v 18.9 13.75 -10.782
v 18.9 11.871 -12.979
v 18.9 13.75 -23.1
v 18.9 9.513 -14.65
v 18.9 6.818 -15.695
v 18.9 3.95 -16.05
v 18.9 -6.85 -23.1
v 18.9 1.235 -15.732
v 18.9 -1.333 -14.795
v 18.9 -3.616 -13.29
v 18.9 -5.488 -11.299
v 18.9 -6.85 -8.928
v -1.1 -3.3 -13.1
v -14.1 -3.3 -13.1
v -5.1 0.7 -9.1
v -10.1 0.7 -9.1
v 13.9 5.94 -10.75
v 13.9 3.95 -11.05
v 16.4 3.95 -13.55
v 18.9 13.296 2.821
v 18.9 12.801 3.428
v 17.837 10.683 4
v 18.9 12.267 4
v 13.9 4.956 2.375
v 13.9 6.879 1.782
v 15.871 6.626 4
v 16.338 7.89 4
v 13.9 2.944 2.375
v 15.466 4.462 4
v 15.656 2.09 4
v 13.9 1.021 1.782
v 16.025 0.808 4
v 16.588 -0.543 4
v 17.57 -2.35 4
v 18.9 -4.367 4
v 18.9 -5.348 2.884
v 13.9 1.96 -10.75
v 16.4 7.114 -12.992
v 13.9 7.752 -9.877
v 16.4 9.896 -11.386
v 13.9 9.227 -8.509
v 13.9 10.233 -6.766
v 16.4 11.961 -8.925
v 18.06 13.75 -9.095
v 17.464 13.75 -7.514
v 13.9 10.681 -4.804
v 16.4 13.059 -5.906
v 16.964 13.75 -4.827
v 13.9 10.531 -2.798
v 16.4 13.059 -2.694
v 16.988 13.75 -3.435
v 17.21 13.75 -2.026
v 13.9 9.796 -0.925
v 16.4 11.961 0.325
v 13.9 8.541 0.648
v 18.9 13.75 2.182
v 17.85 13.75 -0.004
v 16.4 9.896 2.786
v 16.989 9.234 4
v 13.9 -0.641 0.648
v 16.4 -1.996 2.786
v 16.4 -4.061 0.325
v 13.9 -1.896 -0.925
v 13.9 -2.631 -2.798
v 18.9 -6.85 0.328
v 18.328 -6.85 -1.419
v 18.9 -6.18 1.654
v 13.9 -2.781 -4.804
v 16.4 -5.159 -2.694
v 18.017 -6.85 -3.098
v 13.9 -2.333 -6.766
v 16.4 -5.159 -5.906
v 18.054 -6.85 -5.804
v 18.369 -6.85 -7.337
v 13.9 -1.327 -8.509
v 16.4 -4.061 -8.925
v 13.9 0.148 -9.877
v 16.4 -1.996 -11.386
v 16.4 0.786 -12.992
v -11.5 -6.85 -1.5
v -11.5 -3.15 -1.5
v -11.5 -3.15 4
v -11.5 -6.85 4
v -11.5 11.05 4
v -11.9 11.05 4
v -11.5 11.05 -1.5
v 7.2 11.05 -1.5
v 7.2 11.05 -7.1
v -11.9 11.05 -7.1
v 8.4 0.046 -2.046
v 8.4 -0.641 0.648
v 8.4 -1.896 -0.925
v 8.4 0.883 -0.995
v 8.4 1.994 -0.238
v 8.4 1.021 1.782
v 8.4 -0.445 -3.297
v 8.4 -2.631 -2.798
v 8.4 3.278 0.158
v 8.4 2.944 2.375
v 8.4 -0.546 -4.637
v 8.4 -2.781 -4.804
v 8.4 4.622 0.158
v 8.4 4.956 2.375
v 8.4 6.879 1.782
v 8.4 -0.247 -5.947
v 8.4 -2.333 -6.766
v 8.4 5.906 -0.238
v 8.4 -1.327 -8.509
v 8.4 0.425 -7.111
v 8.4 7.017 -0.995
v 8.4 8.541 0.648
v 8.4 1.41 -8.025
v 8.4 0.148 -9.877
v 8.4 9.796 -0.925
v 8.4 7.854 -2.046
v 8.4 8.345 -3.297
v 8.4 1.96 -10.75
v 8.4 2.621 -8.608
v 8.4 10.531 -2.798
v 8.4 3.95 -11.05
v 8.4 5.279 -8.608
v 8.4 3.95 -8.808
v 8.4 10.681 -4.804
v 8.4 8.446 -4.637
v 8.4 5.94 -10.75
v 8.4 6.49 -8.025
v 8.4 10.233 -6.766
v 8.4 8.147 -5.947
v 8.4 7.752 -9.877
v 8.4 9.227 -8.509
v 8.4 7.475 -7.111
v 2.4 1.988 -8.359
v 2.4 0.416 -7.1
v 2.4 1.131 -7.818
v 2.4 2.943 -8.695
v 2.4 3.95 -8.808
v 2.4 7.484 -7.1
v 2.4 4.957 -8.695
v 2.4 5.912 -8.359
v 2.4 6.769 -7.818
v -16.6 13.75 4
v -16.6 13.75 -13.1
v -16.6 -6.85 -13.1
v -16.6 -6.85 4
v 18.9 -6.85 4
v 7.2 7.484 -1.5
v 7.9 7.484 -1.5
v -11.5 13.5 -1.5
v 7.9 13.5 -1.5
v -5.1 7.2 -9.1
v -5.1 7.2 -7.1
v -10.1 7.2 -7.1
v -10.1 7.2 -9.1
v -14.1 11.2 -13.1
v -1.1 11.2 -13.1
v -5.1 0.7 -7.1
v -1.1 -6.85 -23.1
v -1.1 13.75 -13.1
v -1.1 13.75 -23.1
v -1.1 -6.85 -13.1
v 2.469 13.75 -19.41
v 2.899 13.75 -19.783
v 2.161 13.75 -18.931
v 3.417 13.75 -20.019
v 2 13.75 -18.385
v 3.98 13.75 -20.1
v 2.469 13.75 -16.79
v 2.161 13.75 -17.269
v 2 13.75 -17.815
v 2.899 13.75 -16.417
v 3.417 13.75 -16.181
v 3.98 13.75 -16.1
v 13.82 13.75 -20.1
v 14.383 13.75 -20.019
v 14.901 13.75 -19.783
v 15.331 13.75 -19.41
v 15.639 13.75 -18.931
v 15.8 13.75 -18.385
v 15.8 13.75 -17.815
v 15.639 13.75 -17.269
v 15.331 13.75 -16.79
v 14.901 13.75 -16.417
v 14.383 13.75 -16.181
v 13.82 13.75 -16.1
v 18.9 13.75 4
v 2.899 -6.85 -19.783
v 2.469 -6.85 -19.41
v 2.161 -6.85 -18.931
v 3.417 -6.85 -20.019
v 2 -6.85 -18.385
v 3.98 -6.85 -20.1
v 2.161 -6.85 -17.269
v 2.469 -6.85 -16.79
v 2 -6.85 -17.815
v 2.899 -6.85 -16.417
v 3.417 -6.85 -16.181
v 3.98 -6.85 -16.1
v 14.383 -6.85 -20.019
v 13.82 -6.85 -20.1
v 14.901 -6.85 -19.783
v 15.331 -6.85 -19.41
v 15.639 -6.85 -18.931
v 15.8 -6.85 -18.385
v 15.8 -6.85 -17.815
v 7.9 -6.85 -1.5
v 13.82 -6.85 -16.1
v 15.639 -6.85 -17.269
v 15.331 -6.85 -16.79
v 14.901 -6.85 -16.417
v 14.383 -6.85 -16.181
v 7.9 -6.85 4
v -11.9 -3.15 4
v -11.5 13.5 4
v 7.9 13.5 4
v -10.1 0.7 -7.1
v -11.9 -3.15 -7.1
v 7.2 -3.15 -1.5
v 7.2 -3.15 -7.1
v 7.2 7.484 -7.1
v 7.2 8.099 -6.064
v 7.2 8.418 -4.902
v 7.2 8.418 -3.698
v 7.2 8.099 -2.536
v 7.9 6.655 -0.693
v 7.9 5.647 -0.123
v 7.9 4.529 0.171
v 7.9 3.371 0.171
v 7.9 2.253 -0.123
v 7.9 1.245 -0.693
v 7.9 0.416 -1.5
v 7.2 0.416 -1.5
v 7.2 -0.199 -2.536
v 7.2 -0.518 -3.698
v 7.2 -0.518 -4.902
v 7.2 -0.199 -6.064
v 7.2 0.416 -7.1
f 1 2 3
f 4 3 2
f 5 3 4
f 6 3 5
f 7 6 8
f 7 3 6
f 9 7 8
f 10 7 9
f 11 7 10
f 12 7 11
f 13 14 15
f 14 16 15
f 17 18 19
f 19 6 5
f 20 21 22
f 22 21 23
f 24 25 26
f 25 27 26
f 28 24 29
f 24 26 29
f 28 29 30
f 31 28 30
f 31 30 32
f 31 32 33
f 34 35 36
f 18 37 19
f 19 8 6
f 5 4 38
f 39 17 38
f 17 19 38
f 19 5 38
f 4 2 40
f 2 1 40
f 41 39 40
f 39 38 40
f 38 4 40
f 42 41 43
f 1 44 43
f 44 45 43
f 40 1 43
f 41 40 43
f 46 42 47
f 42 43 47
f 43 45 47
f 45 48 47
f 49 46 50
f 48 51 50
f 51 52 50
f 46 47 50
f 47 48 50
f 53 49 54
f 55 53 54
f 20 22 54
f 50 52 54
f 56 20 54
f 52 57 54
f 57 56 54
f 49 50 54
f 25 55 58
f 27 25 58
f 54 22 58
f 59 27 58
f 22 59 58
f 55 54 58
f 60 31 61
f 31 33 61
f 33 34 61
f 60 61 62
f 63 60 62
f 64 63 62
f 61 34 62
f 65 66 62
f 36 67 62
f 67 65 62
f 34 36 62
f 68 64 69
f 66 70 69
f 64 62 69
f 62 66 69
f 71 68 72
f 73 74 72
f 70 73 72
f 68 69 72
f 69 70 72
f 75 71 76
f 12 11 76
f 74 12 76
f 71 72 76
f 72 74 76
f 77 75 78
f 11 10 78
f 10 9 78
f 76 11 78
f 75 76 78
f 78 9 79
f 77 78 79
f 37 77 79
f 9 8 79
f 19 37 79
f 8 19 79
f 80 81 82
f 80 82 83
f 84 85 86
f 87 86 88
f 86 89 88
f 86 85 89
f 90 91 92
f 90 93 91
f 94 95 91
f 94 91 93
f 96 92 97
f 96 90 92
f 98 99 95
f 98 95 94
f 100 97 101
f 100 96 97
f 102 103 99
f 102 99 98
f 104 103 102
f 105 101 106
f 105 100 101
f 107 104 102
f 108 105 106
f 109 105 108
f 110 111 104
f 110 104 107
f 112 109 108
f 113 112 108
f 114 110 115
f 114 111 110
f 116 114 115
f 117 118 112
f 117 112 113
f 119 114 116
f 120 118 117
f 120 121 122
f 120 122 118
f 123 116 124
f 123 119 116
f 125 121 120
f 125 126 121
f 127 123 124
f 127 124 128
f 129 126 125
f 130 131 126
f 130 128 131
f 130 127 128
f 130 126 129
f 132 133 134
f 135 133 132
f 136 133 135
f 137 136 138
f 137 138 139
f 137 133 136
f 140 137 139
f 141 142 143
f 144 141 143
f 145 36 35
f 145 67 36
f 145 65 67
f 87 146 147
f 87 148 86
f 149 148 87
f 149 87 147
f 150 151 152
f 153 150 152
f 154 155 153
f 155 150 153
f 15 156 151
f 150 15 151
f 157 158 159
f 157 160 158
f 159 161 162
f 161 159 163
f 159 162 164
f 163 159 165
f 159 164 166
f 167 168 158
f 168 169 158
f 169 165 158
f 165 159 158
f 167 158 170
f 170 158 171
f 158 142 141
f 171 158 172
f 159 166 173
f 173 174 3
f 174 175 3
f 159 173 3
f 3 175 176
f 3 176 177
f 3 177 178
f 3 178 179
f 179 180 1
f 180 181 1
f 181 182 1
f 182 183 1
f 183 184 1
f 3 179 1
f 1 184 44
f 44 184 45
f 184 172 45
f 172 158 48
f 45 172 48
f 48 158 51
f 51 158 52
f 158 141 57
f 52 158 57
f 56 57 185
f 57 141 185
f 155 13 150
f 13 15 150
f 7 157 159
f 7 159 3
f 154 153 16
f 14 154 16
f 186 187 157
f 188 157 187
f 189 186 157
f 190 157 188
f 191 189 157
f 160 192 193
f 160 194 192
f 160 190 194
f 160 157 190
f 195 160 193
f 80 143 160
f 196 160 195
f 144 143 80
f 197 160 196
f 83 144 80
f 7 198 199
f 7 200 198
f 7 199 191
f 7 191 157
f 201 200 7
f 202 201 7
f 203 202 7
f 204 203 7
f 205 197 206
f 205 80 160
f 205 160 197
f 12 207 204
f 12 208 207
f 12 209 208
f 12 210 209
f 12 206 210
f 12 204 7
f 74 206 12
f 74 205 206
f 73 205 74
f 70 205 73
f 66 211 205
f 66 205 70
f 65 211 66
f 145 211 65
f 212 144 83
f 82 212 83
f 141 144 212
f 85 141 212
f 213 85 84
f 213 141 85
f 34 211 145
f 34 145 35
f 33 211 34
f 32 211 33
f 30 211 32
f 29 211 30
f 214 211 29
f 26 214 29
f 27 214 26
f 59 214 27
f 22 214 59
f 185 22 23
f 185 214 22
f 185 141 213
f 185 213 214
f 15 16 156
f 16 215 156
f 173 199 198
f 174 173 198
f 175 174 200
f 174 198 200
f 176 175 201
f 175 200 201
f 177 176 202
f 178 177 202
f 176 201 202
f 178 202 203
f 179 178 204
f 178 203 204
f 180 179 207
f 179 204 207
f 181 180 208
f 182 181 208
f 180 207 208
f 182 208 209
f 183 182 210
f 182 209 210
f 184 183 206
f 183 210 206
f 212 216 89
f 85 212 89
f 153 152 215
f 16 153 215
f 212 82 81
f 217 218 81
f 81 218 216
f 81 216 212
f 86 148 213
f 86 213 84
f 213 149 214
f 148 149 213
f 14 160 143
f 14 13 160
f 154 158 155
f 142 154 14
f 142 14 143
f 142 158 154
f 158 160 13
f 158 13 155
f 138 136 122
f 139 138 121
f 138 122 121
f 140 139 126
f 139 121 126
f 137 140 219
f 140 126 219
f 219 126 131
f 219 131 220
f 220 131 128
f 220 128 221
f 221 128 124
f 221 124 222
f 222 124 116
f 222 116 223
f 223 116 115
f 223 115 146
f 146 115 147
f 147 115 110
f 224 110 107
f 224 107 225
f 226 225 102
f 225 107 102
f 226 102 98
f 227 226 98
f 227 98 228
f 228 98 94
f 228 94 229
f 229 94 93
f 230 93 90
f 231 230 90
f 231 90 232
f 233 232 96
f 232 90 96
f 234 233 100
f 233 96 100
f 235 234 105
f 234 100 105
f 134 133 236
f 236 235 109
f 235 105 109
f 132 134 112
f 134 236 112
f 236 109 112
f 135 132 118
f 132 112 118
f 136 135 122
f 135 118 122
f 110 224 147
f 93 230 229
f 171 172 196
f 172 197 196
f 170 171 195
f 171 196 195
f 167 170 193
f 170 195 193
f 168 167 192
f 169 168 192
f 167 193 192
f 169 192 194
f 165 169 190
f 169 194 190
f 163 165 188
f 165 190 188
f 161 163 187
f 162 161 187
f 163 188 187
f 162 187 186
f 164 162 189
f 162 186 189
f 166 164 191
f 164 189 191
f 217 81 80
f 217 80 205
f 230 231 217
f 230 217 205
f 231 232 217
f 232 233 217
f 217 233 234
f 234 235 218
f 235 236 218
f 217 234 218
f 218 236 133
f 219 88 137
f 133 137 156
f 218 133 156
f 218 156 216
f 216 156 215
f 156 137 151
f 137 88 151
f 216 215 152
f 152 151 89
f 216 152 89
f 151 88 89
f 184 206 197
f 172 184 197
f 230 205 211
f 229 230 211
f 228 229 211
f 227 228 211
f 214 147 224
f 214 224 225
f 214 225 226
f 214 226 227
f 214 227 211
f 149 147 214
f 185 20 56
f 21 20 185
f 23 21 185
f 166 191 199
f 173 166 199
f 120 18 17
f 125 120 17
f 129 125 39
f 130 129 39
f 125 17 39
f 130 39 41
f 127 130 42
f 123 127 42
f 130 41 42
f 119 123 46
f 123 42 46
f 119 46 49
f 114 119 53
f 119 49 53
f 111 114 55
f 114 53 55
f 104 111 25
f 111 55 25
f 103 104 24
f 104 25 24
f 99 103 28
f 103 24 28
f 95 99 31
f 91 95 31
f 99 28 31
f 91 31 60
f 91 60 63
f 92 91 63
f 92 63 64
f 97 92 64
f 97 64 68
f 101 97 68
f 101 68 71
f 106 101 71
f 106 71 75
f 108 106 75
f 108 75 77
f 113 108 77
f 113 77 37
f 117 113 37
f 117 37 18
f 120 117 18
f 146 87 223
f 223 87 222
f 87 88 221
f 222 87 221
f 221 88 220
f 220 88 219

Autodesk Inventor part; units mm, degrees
ref_plane "YZ Plane" through (0, 0, 0) normal (1, 0, 0) x (0, 1, 0)
ref_plane "XZ Plane" through (0, 0, 0) normal (0, 1, 0) x (-1, 0, 0)
ref_plane "Arbeitsebene1" through (0, 0, 0) normal (0, 0, 1) x (1, 0, 0)
ref_plane "Arbeitsebene2" through (-2.35, 3.95, -7.1) normal (0, 0, -1) x (-1, 0, 0)
sketch "Skizze1" plane through (-2.35, 3.95, -7.1) normal (0, 0, -1) x (-1, 0, 0)
  line L0 (7.75, 3.25) -> (7.75, -3.25) projected
  line L1 (7.75, -3.25) -> (2.75, -3.25) projected
  line L2 (2.75, -3.25) -> (2.75, 3.25) projected
  line L3 (2.75, 3.25) -> (7.75, 3.25) projected
  line L4 (9.25, -6.8) -> (9.25, 6.8) projected
  line L5 (9.25, 6.8) -> (-9.25, 6.8) projected
  line L6 (-9.25, 6.8) -> (-9.25, -6.8) projected
  line L7 (-9.25, -6.8) -> (9.25, -6.8) projected
  line L8 (14.25, 9.8) -> (-21.25, 9.8)
  line L9 (-21.25, 9.8) -> (-21.25, -10.8)
  line L10 (-21.25, -10.8) -> (14.25, -10.8)
  line L11 (14.25, -10.8) -> (14.25, 9.8)
  point P0 (-2.35, -3.95)
  dimension "d0" = 5
  dimension "d1" = 3
  dimension "d2" = 4
  dimension "d3" = 12
extrude "Extrusion1" add sketch "Skizze1" along normal blind 6 contours L7 L6 L5 L4 | L11 L10 L9 L8
sketch "Skizze2" plane through (-2.35, 3.95, -7.1) normal (0, 0, 1) x (1, 0, 0)
  line L0 (-9.25, -6.8) -> (-9.25, 6.8) projected
  line L1 (9.25, -6.8) -> (-9.25, -6.8) projected
  line L2 (9.25, 6.8) -> (9.25, -6.8) projected
  line L3 (-9.25, 6.8) -> (9.25, 6.8) projected
  line L4 (9.55, 7.1) -> (9.55, -7.1)
  line L5 (9.55, -7.1) -> (-9.55, -7.1)
  line L6 (-9.55, -7.1) -> (-9.55, 7.1)
  line L7 (-9.55, 7.1) -> (9.55, 7.1)
  line L8 (21.25, 9.8) -> (21.25, -10.8) projected
  line L9 (-14.25, 9.8) -> (21.25, 9.8) projected
  line L10 (-14.25, -10.8) -> (-14.25, 9.8) projected
  line L11 (21.25, -10.8) -> (-14.25, -10.8) projected
  line L12 (-7.75, 3.25) -> (-7.75, -3.25) projected
  line L13 (-2.75, 3.25) -> (-7.75, 3.25) projected
  line L14 (-2.75, -3.25) -> (-2.75, 3.25) projected
  line L15 (-7.75, -3.25) -> (-2.75, -3.25) projected
  point P0 (2.35, -3.95)
  dimension "d6" = 0.3
ref_plane "Arbeitsebene3" through (-10.5, -12.5, -1.5) normal (0, 0, -1) x (0, 1, 0)
extrude "Extrusion2" add sketch "Skizze2" along normal up to surface (5.6 mm away) contours L8 L11 L10 L9
sketch "Skizze3" plane through (-16.6, 13.75, -1.5) normal (0, 0, 1) x (1, 0, 0)
  line L0 (23.5, -26.25) -> (23.5, -1.25) projected
  line L1 (23.5, -1.25) -> (6.1, -1.25) projected
  line L2 (6.1, -1.25) -> (6.1, -26.25) projected
  line L3 (6.1, -26.25) -> (23.5, -26.25) projected
  line L4 (24.5, -27.25) -> (24.5, -0.25)
  line L5 (24.5, -0.25) -> (5.1, -0.25)
  line L6 (5.1, -0.25) -> (5.1, -27.25)
  line L7 (5.1, -27.25) -> (24.5, -27.25)
  line L8 (4.7, -2.7) -> (23.8, -2.7) projected
  line L9 (23.8, -2.7) -> (23.8, -16.9) projected
  line L10 (23.8, -16.9) -> (4.7, -16.9) projected
  line L11 (4.7, -16.9) -> (4.7, -2.7) projected
  line L12 (35.5, 0) -> (0, 0) projected
  line L13 (0, 0) -> (0, -20.6) projected
  line L14 (0, -20.6) -> (35.5, -20.6) projected
  line L15 (35.5, -20.6) -> (35.5, 0) projected
  point P0 (16.6, -13.75)
  point P1 (24.5, -20.6)
  point P2 (5.1, -20.6)
  point P3 (5.1, -16.9)
  point P4 (5.1, -2.7)
  dimension "d9" = 1
extrude "Extrusion3" add sketch "Skizze3" along normal blind 5.5 contours L4 L5 L6 L8 L11 L10 L14 L13 L12 L15
sketch "Skizze4" plane through (18.9, -6.85, -13.1) normal (1, 0, 0) x (0, 0, -1)
  circle A0 centre (-8.8, 10.8) radius 6.75
  circle A1 centre (-8.8, 10.8) radius 6.5405 projected
  point P0 (-13.1, 6.85)
  dimension "d30" = 13.5
extrude "Extrusion4" cut sketch "Skizze4" against normal blind 10.5 contours A0 | A1
sketch "Skizze5" plane through (8.4, -6.85, -13.1) normal (1, 0, 0) x (0, 0, -1)
  circle A0 centre (-8.8, 10.8) radius 4.5085 projected
  point P0 (-13.1, 6.85)
extrude "Extrusion5" cut sketch "Skizze5" against normal blind 6
sketch "Skizze6" plane through (-16.6, -6.85, -13.1) normal (0, -1, 0) x (1, 0, 0)
  line L0 (0, 17.1) -> (0, 0) projected
  line L1 (35.5, 0) -> (0, 0) projected
  line L2 (35.5, 17.1) -> (35.5, 0) projected
  line L3 (24.5, 17.1) -> (35.5, 17.1) projected
  line L4 (24.5, 11.6) -> (24.5, 17.1) projected
  line L5 (5.1, 11.6) -> (24.5, 11.6) projected
  line L6 (5.1, 11.6) -> (5.1, 17.1) projected
  line L7 (0, 17.1) -> (5.1, 17.1) projected
  line L8 (11.5, 6) -> (11.5, 0) projected
  line L9 (35.5, 0) -> (15.5, 0)
  line L10 (15.5, 0) -> (15.5, -10)
  line L11 (15.5, -10) -> (35.5, -10)
  line L12 (35.5, -10) -> (35.5, 0)
  line L13 (30.4199, -5) -> (20.5801, -5) construction
  line L14 (30.4199, -3) -> (20.5801, -3)
  line L15 (20.5801, -7) -> (30.4199, -7)
  arc A0 (30.4199, -7) -> (30.4199, -3) centre (30.4199, -5) ccw
  arc A1 (20.5801, -3) -> (20.5801, -7) centre (20.5801, -5) ccw
  point P0 (16.6, 13.1)
  point P1 (25.5, -5)
  dimension "d19" = 20
  dimension "d20" = 10
  dimension "d21" = 4
extrude "Extrusion6" add sketch "Skizze6" against normal up to surface (20.6 mm away) contours L1 L12 L11 L10
chamfer "Fase1" distance 5 angle 45 1 edges at (18.9, 3.95, 2.45)
chamfer "Fase2" distance 4 angle 45 4 edges at (-7.6, 0.7, -13.1) (-10.1, 3.95, -13.1) (-7.6, 7.2, -13.1) (-5.1, 3.95, -13.1)
properties part number "30_Scanlens_Laseradaper_v0"
